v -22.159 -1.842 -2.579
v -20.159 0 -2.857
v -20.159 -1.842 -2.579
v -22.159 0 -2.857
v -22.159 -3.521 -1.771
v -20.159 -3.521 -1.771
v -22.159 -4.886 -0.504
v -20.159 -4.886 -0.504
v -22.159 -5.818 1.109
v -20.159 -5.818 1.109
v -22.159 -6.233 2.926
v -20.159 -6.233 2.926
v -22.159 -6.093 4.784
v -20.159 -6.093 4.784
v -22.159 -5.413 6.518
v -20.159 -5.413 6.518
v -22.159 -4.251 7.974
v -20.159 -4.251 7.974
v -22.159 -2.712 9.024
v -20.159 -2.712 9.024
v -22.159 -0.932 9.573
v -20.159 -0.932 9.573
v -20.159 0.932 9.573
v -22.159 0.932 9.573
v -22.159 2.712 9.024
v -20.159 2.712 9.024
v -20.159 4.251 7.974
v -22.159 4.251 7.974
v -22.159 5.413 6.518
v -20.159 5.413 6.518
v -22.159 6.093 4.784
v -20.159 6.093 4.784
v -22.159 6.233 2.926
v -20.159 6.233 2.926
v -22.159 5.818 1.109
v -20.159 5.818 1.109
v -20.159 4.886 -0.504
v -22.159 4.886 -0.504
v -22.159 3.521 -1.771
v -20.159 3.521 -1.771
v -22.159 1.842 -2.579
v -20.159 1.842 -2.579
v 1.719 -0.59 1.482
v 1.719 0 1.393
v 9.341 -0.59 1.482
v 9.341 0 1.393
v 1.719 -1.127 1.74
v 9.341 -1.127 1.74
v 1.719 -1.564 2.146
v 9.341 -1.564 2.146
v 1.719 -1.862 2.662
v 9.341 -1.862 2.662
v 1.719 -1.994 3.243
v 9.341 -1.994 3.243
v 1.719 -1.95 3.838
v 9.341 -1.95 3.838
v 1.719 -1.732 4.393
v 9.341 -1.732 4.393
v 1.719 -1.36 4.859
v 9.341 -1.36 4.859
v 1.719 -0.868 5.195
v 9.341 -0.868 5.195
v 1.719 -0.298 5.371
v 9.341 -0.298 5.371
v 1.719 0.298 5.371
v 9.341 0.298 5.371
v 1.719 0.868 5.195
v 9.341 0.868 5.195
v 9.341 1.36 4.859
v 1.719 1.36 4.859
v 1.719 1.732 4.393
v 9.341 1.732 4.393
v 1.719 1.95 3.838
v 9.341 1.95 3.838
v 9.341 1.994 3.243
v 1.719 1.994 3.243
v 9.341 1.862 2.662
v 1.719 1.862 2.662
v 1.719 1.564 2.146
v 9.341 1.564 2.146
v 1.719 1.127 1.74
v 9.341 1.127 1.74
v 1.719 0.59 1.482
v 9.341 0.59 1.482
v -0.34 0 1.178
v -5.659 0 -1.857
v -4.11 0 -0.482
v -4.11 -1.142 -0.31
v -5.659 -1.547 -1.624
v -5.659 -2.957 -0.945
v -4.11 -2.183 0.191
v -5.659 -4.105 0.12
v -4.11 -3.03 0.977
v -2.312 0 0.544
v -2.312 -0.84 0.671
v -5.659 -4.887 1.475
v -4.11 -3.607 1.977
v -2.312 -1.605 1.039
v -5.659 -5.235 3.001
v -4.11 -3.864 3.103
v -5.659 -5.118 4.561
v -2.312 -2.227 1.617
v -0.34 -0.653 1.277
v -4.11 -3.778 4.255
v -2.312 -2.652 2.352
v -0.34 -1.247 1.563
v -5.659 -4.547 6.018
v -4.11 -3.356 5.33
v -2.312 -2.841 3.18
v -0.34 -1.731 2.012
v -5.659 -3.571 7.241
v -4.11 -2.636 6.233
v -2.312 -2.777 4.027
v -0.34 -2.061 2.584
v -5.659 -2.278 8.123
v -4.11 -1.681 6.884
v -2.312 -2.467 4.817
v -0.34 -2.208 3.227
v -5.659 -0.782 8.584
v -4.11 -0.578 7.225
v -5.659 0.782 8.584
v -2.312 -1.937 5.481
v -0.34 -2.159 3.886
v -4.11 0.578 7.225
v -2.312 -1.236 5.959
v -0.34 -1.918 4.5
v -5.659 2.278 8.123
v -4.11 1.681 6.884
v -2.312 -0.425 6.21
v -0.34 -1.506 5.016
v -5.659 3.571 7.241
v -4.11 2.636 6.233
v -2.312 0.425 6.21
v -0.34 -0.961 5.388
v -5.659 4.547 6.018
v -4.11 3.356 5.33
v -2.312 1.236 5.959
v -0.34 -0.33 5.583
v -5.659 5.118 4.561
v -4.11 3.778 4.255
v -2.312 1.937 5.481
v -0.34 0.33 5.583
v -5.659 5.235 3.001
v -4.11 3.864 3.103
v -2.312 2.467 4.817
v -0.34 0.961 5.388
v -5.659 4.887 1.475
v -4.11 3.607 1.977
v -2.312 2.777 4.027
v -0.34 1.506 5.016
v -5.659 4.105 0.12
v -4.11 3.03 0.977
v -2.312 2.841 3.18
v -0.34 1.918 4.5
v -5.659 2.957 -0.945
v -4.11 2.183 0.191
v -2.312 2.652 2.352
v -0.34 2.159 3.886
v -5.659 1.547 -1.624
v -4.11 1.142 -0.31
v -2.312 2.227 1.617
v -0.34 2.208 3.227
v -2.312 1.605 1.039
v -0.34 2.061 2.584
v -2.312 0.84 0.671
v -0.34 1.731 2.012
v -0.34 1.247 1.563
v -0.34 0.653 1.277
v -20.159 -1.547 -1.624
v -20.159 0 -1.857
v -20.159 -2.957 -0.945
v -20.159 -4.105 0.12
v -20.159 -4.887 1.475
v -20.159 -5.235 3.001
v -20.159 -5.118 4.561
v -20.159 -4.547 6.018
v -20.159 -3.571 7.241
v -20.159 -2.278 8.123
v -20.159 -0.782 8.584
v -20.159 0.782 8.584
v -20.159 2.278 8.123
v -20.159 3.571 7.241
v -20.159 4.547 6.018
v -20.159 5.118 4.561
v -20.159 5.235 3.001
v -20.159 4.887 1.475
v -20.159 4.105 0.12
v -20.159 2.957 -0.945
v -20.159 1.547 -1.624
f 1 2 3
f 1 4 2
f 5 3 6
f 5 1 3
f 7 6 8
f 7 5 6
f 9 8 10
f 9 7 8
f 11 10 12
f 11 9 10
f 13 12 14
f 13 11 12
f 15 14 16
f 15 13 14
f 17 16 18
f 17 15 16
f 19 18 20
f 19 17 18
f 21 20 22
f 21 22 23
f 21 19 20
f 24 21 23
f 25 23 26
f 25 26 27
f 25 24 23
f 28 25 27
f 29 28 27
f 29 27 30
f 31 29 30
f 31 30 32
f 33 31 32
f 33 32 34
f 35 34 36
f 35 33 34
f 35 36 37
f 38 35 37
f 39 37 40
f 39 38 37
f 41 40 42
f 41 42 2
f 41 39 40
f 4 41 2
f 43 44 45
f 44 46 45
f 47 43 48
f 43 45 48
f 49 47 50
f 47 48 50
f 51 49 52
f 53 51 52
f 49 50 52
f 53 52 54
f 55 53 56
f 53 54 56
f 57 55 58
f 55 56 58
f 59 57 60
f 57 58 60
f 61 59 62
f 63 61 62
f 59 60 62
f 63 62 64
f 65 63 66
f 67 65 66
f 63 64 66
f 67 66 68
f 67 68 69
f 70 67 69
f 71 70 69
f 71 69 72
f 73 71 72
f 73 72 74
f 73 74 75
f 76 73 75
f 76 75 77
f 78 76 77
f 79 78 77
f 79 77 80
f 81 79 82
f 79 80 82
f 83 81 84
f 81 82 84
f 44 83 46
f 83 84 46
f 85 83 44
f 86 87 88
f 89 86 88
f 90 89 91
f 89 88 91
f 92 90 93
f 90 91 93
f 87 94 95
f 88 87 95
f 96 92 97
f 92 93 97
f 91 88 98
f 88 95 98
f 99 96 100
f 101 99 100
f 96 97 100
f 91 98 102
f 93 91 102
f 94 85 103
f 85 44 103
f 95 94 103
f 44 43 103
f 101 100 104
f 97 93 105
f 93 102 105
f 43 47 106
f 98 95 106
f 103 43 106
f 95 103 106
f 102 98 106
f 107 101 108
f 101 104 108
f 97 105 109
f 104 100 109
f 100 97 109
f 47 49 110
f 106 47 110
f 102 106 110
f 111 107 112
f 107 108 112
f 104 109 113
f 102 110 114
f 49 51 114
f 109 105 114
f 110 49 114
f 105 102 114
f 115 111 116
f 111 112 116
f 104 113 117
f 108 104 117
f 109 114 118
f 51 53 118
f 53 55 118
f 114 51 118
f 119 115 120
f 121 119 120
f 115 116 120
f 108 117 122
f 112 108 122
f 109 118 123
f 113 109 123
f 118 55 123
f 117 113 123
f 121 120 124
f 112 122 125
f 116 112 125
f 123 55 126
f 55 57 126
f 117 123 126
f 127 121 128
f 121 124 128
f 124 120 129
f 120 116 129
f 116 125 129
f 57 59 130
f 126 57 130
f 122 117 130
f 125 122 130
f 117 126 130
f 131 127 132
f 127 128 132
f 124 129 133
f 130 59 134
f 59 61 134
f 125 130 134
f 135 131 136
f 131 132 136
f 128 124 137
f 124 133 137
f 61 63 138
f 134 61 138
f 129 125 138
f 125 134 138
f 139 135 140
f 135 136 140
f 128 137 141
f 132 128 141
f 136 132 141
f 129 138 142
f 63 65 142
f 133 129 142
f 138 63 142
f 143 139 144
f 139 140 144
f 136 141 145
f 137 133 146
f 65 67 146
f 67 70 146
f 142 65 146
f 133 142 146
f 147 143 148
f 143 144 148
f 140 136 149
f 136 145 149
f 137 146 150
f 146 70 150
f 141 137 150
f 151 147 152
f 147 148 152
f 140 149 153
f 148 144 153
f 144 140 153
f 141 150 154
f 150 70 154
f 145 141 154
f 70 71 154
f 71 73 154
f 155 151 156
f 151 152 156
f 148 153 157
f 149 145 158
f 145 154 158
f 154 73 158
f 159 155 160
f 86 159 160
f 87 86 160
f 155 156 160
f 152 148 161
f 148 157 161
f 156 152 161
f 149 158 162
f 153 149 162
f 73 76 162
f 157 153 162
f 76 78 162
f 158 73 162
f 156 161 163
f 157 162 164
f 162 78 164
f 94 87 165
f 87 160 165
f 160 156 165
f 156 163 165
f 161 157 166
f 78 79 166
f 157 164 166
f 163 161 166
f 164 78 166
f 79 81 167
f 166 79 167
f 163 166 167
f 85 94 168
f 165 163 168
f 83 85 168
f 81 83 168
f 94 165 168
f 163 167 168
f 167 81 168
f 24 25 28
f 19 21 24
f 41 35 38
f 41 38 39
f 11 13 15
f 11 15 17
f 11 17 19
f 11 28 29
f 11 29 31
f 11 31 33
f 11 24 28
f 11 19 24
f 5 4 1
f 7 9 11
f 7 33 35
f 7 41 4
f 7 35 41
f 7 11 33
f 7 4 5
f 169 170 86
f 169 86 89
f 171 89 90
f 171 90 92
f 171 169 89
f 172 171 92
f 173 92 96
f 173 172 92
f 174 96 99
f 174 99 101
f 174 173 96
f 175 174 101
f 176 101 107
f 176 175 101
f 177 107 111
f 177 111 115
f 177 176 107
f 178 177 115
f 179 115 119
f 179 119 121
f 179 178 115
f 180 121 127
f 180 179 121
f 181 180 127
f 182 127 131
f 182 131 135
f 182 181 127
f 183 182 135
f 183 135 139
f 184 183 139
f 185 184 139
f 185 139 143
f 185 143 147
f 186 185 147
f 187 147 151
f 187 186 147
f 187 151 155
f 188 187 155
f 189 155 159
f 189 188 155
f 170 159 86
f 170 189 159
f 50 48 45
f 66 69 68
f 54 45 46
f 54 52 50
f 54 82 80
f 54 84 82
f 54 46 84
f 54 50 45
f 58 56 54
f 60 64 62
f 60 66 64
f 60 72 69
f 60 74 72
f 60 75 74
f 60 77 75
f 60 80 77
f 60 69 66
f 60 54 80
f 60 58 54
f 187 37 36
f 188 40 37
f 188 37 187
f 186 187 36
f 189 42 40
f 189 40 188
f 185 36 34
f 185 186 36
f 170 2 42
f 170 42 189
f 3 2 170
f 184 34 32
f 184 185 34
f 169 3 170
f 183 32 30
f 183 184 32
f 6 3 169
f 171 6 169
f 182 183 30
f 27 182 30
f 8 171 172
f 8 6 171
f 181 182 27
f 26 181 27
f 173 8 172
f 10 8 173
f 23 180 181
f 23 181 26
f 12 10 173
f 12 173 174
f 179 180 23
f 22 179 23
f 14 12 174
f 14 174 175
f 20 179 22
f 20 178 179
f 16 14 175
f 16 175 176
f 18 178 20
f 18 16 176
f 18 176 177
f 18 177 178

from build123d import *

# Parameters (mm, degrees)
SKETCH_1_W = 15
SKETCH_1_H = 2
FILLET_1_R = 10


with BuildPart() as part:
    # 草图1 → 旋转1 (revolve)
    with BuildSketch(Plane(origin=(0, 0, 0), x_dir=(1, 0, 0), z_dir=(0, 1, 0))):
        Polygon((-22.158783784, -3.392857143), (-20.158783784, -3.392857143), (-20.158783784, 1.857142857), (-20.158783784, 2.857142857), (-22.158783784, 2.857142857), align=None)
        Polygon((-20.158783784, -3.392857143), (-5.658783784, -3.392857143), (-5.658783784, -1.392857143), (-5.658783784, 1.857142857), (-20.158783784, 1.857142857), align=None)
        with Locations((1.841216216, -2.392857143)):
            Rectangle(SKETCH_1_W, SKETCH_1_H)
    revolve(axis=Axis((9.341216216, 0, 3.392857143), (-1, 0, 0)))

    # 圆角1
    # the kernel refuses this fillet: 10 mm, written as the material it adds along each edge
    with BuildSketch(Plane(origin=(-5.658783784, 0, 3.392857143), x_dir=(0, 0, -1), z_dir=(0, 1, 0))) as fillet_1_piece_1:
        with BuildLine():
            CenterArc((12, -7.378177282), FILLET_1_R, 132.454150204, 47.545849796)
            Line((2, -7.378177282), (1.8, -7.378177282))
            Line((1.8, -7.378177282), (1.8, 0))
            Line((1.8, 0), (2, 0.2))
            ThreePointArc((2, 0.2), (3.625, 0.2), (5.115, 0.147563546))
            Line((5.115, 0.147563546), (5.25, 0))
        make_face()
    revolve(axis=Axis((-5.658783784, 0, 3.392857143), (-1, 0, 0)))


solid = part.part
